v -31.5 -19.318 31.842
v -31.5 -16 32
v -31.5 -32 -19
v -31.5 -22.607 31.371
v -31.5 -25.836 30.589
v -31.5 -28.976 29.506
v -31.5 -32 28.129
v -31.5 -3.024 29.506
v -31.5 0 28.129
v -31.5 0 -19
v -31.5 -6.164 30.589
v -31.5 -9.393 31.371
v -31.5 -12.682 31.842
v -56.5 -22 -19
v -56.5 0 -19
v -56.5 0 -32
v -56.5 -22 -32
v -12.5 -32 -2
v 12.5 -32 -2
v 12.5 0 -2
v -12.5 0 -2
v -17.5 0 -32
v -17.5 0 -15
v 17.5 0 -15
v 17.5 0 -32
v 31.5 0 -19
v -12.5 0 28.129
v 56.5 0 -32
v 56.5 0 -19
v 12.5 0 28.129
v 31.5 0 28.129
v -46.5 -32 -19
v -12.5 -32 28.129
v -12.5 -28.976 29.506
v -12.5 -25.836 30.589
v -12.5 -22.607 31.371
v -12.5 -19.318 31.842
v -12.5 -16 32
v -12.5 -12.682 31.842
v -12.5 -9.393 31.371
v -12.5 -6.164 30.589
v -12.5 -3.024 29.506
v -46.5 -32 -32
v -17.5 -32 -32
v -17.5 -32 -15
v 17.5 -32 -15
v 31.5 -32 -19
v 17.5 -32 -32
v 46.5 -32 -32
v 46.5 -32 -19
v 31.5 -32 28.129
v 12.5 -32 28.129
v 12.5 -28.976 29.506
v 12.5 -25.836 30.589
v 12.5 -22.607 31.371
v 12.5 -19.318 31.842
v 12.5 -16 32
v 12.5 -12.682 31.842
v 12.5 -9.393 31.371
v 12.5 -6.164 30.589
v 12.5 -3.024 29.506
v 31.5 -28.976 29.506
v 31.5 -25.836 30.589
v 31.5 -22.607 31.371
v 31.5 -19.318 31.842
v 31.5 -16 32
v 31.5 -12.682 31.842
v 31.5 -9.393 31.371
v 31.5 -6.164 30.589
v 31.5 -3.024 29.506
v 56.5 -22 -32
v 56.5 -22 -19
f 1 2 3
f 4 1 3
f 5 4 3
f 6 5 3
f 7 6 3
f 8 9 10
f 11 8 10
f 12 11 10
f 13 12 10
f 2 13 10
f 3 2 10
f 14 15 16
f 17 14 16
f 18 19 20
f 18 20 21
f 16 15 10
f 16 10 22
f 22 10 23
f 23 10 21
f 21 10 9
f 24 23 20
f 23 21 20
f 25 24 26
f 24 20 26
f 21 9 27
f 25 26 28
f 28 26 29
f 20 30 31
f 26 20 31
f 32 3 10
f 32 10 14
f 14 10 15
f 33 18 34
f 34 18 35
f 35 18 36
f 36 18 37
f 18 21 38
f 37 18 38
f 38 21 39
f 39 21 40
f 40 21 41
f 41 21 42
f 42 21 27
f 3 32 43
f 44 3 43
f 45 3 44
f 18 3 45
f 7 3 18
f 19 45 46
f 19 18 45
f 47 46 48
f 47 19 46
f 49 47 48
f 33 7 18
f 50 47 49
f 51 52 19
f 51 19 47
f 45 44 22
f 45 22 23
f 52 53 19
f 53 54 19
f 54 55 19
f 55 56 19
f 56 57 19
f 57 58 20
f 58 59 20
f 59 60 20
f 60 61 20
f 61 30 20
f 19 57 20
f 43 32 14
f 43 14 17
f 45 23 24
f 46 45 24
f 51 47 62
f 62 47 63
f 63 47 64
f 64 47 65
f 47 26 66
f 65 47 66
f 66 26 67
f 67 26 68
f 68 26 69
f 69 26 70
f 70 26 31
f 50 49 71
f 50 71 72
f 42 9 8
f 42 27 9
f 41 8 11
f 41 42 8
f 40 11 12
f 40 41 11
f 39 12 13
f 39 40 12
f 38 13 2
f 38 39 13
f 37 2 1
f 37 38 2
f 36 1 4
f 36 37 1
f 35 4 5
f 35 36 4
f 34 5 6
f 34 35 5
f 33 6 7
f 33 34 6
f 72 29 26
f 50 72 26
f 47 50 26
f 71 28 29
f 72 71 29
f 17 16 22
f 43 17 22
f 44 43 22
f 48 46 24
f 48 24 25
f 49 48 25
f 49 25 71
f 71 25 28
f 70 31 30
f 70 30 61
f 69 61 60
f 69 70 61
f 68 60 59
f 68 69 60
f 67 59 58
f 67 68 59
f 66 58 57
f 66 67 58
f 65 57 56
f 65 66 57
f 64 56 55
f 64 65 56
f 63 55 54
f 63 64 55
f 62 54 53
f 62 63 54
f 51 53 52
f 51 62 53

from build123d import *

# Parameters (mm, degrees)
F1_DEPTH = 32
F2_R     = 43.740238
F2_R_2   = 35
F3_DEPTH = 88.001
F4_SIZE2 = 10
F4_SIZE  = 10


with BuildPart() as f1:
    # F0 (on Front) → F1 (new body)
    with BuildSketch(Plane.XZ):
        Polygon((-12.5, 32), (-31.5, 32), (-31.5, -19), (-56.5, -19), (-56.5, -32), (-17.5, -32), (-17.5, -15), (17.5, -15), (17.5, -32), (56.5, -32), (56.5, -19), (31.5, -19), (31.5, 32), (12.5, 32), (12.5, -2), (-12.5, -2), align=None)
    extrude(amount=F1_DEPTH)

    # F2 (on face) → F3 (cut, through all)
    with BuildSketch(Plane.YZ.offset(31.5)):
        with Locations((-16, -3)):
            Circle(F2_R)
        with Locations((-16, -3)):
            Circle(F2_R_2, mode=Mode.SUBTRACT)
    extrude(amount=-F3_DEPTH, mode=Mode.SUBTRACT)

    # F4
    f4_edges = [f1.edges().sort_by_distance(p)[0] for p in [
        (-56.5, -32, -25.5),
        (56.5, -32, -25.5),
    ]]
    chamfer(f4_edges, length=F4_SIZE, length2=F4_SIZE2)


solid = f1.part
